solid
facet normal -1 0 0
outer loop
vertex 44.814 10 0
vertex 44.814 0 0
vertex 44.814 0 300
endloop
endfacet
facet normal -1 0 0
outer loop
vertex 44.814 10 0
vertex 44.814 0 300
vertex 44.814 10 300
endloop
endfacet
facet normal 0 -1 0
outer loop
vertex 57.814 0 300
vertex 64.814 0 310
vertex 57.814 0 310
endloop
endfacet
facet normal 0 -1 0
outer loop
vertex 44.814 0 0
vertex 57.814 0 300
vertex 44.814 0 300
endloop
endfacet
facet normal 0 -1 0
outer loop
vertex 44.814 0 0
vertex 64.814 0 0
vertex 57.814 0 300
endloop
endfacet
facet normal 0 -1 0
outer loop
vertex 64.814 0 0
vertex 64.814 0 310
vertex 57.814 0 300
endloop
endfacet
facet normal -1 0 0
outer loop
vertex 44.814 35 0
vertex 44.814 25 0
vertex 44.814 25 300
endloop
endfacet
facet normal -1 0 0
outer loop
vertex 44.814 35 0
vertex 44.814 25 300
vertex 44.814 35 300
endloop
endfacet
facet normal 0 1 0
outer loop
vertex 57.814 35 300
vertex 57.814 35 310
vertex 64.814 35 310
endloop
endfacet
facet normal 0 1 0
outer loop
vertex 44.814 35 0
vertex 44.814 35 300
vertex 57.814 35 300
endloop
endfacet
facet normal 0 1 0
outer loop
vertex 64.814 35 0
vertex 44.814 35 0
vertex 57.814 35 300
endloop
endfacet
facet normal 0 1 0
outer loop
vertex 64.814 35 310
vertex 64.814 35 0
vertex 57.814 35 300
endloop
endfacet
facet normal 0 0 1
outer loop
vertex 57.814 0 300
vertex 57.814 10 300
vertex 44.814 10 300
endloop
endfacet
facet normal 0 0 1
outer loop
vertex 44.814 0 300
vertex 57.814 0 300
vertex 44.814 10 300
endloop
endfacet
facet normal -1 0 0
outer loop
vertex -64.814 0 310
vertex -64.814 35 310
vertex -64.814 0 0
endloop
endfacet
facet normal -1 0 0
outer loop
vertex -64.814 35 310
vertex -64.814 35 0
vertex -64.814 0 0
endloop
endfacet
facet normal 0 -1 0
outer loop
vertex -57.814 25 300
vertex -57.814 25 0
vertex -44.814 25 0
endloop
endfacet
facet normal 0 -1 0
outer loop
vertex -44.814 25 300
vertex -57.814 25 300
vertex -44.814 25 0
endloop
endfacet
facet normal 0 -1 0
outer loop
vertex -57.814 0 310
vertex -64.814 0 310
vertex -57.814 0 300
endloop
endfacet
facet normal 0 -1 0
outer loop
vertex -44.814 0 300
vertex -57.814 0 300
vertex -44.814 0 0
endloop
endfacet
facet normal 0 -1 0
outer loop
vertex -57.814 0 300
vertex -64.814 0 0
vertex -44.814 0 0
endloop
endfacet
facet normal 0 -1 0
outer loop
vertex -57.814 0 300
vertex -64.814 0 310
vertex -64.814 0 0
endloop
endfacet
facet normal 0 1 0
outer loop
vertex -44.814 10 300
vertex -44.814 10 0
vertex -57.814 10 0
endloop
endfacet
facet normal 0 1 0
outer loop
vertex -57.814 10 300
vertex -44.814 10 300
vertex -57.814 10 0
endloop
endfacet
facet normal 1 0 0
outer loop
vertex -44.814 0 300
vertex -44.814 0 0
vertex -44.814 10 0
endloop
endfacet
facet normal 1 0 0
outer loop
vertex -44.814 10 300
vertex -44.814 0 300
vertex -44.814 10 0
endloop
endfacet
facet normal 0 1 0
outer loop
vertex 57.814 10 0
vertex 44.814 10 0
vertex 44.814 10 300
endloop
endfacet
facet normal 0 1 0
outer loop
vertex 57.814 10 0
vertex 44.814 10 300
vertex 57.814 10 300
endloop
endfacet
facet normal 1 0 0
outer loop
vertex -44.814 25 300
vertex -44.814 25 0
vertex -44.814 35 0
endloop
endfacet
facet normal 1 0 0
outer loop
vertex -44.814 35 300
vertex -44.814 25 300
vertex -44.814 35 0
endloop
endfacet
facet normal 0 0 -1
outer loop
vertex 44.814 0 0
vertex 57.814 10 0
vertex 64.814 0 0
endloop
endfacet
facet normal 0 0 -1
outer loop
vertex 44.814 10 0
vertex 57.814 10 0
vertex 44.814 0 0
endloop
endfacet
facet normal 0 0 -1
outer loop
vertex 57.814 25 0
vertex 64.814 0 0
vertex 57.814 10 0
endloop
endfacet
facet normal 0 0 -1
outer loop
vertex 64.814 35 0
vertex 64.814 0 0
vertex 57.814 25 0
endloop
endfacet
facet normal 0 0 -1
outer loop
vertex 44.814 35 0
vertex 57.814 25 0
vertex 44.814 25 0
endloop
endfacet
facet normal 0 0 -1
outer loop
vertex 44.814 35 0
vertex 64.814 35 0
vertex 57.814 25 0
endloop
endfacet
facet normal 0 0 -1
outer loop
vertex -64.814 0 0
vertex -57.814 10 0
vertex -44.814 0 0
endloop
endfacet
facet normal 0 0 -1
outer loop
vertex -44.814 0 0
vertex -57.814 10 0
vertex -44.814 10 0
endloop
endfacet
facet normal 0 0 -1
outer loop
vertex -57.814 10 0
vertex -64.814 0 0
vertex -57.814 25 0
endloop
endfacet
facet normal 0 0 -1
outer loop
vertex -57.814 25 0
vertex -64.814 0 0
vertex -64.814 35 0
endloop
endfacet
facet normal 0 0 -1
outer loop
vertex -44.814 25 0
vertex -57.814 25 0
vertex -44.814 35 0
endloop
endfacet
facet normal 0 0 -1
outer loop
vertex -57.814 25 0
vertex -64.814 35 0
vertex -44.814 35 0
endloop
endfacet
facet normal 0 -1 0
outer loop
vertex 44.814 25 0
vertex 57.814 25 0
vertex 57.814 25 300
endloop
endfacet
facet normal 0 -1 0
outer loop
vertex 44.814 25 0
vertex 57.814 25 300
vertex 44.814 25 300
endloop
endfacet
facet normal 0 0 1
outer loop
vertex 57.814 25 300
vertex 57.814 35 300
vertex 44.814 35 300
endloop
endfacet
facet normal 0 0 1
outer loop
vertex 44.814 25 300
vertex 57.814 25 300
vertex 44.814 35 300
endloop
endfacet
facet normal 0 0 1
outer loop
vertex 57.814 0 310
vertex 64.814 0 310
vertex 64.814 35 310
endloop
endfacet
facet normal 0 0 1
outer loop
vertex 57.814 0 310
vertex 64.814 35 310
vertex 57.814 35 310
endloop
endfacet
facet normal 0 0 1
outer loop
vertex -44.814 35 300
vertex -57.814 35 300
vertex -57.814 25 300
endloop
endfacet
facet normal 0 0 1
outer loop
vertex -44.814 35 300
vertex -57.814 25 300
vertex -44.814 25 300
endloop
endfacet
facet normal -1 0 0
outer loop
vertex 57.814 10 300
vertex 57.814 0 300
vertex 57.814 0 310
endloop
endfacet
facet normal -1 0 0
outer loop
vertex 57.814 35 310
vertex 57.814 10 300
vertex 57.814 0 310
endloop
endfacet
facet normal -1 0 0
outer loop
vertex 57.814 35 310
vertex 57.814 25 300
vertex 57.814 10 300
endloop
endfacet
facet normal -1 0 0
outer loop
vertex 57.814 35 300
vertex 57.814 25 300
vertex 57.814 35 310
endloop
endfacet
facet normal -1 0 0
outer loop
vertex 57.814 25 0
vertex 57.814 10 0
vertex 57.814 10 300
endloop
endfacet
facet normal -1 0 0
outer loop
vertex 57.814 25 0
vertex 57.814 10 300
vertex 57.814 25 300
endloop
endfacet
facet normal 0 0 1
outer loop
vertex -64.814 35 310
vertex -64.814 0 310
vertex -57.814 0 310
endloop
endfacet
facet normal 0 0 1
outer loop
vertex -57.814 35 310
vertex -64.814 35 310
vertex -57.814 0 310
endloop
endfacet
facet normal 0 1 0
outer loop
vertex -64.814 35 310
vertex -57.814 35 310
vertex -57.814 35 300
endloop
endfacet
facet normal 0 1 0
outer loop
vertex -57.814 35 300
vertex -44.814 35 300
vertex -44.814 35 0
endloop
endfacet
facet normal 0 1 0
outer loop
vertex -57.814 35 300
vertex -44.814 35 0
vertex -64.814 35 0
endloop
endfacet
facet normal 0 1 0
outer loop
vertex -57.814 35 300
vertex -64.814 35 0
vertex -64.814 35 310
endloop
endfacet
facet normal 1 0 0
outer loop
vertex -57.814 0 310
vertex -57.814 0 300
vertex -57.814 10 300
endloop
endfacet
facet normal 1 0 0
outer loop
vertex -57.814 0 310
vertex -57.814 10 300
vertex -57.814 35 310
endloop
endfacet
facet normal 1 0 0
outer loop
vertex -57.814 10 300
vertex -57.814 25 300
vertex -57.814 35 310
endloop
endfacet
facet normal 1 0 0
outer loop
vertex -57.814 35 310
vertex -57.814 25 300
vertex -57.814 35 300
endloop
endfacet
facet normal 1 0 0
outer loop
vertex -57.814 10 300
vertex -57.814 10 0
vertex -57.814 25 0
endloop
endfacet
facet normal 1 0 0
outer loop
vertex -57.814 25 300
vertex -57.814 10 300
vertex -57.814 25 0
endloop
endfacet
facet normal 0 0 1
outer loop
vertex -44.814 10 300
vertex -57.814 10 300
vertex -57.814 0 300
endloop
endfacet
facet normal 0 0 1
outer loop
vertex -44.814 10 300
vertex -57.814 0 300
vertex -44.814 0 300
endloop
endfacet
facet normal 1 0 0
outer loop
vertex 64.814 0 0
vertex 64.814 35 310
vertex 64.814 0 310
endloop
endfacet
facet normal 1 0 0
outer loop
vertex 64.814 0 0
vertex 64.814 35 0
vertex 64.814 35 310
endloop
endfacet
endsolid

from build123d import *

# Parameters (mm, degrees)
F1_DEPTH = 300
F3_DEPTH = 10


with BuildPart() as f1:
    # F0 (on Top) → F1 (new body)
    with BuildSketch(Plane.XY):
        Polygon((-64.813509, 0), (-44.813509, 0), (-44.813509, 10), (-57.813509, 10), (-57.813509, 25), (-44.813509, 25), (-44.813509, 35), (-64.813509, 35), align=None)
    extrude(amount=F1_DEPTH)

    # F2 (on face) → F3 (join)
    with BuildSketch(Plane.XY.offset(300)):
        Polygon((-57.813509, 10), (-57.813509, 25), (-57.813509, 35), (-64.813509, 35), (-64.813509, 0), (-57.813509, 0), align=None)
    extrude(amount=F3_DEPTH)


with BuildPart() as f4_1:
    # F4: instance of F1
    add(f1.part.mirror(Plane.YZ))


solid = Compound([f1.part, f4_1.part])
